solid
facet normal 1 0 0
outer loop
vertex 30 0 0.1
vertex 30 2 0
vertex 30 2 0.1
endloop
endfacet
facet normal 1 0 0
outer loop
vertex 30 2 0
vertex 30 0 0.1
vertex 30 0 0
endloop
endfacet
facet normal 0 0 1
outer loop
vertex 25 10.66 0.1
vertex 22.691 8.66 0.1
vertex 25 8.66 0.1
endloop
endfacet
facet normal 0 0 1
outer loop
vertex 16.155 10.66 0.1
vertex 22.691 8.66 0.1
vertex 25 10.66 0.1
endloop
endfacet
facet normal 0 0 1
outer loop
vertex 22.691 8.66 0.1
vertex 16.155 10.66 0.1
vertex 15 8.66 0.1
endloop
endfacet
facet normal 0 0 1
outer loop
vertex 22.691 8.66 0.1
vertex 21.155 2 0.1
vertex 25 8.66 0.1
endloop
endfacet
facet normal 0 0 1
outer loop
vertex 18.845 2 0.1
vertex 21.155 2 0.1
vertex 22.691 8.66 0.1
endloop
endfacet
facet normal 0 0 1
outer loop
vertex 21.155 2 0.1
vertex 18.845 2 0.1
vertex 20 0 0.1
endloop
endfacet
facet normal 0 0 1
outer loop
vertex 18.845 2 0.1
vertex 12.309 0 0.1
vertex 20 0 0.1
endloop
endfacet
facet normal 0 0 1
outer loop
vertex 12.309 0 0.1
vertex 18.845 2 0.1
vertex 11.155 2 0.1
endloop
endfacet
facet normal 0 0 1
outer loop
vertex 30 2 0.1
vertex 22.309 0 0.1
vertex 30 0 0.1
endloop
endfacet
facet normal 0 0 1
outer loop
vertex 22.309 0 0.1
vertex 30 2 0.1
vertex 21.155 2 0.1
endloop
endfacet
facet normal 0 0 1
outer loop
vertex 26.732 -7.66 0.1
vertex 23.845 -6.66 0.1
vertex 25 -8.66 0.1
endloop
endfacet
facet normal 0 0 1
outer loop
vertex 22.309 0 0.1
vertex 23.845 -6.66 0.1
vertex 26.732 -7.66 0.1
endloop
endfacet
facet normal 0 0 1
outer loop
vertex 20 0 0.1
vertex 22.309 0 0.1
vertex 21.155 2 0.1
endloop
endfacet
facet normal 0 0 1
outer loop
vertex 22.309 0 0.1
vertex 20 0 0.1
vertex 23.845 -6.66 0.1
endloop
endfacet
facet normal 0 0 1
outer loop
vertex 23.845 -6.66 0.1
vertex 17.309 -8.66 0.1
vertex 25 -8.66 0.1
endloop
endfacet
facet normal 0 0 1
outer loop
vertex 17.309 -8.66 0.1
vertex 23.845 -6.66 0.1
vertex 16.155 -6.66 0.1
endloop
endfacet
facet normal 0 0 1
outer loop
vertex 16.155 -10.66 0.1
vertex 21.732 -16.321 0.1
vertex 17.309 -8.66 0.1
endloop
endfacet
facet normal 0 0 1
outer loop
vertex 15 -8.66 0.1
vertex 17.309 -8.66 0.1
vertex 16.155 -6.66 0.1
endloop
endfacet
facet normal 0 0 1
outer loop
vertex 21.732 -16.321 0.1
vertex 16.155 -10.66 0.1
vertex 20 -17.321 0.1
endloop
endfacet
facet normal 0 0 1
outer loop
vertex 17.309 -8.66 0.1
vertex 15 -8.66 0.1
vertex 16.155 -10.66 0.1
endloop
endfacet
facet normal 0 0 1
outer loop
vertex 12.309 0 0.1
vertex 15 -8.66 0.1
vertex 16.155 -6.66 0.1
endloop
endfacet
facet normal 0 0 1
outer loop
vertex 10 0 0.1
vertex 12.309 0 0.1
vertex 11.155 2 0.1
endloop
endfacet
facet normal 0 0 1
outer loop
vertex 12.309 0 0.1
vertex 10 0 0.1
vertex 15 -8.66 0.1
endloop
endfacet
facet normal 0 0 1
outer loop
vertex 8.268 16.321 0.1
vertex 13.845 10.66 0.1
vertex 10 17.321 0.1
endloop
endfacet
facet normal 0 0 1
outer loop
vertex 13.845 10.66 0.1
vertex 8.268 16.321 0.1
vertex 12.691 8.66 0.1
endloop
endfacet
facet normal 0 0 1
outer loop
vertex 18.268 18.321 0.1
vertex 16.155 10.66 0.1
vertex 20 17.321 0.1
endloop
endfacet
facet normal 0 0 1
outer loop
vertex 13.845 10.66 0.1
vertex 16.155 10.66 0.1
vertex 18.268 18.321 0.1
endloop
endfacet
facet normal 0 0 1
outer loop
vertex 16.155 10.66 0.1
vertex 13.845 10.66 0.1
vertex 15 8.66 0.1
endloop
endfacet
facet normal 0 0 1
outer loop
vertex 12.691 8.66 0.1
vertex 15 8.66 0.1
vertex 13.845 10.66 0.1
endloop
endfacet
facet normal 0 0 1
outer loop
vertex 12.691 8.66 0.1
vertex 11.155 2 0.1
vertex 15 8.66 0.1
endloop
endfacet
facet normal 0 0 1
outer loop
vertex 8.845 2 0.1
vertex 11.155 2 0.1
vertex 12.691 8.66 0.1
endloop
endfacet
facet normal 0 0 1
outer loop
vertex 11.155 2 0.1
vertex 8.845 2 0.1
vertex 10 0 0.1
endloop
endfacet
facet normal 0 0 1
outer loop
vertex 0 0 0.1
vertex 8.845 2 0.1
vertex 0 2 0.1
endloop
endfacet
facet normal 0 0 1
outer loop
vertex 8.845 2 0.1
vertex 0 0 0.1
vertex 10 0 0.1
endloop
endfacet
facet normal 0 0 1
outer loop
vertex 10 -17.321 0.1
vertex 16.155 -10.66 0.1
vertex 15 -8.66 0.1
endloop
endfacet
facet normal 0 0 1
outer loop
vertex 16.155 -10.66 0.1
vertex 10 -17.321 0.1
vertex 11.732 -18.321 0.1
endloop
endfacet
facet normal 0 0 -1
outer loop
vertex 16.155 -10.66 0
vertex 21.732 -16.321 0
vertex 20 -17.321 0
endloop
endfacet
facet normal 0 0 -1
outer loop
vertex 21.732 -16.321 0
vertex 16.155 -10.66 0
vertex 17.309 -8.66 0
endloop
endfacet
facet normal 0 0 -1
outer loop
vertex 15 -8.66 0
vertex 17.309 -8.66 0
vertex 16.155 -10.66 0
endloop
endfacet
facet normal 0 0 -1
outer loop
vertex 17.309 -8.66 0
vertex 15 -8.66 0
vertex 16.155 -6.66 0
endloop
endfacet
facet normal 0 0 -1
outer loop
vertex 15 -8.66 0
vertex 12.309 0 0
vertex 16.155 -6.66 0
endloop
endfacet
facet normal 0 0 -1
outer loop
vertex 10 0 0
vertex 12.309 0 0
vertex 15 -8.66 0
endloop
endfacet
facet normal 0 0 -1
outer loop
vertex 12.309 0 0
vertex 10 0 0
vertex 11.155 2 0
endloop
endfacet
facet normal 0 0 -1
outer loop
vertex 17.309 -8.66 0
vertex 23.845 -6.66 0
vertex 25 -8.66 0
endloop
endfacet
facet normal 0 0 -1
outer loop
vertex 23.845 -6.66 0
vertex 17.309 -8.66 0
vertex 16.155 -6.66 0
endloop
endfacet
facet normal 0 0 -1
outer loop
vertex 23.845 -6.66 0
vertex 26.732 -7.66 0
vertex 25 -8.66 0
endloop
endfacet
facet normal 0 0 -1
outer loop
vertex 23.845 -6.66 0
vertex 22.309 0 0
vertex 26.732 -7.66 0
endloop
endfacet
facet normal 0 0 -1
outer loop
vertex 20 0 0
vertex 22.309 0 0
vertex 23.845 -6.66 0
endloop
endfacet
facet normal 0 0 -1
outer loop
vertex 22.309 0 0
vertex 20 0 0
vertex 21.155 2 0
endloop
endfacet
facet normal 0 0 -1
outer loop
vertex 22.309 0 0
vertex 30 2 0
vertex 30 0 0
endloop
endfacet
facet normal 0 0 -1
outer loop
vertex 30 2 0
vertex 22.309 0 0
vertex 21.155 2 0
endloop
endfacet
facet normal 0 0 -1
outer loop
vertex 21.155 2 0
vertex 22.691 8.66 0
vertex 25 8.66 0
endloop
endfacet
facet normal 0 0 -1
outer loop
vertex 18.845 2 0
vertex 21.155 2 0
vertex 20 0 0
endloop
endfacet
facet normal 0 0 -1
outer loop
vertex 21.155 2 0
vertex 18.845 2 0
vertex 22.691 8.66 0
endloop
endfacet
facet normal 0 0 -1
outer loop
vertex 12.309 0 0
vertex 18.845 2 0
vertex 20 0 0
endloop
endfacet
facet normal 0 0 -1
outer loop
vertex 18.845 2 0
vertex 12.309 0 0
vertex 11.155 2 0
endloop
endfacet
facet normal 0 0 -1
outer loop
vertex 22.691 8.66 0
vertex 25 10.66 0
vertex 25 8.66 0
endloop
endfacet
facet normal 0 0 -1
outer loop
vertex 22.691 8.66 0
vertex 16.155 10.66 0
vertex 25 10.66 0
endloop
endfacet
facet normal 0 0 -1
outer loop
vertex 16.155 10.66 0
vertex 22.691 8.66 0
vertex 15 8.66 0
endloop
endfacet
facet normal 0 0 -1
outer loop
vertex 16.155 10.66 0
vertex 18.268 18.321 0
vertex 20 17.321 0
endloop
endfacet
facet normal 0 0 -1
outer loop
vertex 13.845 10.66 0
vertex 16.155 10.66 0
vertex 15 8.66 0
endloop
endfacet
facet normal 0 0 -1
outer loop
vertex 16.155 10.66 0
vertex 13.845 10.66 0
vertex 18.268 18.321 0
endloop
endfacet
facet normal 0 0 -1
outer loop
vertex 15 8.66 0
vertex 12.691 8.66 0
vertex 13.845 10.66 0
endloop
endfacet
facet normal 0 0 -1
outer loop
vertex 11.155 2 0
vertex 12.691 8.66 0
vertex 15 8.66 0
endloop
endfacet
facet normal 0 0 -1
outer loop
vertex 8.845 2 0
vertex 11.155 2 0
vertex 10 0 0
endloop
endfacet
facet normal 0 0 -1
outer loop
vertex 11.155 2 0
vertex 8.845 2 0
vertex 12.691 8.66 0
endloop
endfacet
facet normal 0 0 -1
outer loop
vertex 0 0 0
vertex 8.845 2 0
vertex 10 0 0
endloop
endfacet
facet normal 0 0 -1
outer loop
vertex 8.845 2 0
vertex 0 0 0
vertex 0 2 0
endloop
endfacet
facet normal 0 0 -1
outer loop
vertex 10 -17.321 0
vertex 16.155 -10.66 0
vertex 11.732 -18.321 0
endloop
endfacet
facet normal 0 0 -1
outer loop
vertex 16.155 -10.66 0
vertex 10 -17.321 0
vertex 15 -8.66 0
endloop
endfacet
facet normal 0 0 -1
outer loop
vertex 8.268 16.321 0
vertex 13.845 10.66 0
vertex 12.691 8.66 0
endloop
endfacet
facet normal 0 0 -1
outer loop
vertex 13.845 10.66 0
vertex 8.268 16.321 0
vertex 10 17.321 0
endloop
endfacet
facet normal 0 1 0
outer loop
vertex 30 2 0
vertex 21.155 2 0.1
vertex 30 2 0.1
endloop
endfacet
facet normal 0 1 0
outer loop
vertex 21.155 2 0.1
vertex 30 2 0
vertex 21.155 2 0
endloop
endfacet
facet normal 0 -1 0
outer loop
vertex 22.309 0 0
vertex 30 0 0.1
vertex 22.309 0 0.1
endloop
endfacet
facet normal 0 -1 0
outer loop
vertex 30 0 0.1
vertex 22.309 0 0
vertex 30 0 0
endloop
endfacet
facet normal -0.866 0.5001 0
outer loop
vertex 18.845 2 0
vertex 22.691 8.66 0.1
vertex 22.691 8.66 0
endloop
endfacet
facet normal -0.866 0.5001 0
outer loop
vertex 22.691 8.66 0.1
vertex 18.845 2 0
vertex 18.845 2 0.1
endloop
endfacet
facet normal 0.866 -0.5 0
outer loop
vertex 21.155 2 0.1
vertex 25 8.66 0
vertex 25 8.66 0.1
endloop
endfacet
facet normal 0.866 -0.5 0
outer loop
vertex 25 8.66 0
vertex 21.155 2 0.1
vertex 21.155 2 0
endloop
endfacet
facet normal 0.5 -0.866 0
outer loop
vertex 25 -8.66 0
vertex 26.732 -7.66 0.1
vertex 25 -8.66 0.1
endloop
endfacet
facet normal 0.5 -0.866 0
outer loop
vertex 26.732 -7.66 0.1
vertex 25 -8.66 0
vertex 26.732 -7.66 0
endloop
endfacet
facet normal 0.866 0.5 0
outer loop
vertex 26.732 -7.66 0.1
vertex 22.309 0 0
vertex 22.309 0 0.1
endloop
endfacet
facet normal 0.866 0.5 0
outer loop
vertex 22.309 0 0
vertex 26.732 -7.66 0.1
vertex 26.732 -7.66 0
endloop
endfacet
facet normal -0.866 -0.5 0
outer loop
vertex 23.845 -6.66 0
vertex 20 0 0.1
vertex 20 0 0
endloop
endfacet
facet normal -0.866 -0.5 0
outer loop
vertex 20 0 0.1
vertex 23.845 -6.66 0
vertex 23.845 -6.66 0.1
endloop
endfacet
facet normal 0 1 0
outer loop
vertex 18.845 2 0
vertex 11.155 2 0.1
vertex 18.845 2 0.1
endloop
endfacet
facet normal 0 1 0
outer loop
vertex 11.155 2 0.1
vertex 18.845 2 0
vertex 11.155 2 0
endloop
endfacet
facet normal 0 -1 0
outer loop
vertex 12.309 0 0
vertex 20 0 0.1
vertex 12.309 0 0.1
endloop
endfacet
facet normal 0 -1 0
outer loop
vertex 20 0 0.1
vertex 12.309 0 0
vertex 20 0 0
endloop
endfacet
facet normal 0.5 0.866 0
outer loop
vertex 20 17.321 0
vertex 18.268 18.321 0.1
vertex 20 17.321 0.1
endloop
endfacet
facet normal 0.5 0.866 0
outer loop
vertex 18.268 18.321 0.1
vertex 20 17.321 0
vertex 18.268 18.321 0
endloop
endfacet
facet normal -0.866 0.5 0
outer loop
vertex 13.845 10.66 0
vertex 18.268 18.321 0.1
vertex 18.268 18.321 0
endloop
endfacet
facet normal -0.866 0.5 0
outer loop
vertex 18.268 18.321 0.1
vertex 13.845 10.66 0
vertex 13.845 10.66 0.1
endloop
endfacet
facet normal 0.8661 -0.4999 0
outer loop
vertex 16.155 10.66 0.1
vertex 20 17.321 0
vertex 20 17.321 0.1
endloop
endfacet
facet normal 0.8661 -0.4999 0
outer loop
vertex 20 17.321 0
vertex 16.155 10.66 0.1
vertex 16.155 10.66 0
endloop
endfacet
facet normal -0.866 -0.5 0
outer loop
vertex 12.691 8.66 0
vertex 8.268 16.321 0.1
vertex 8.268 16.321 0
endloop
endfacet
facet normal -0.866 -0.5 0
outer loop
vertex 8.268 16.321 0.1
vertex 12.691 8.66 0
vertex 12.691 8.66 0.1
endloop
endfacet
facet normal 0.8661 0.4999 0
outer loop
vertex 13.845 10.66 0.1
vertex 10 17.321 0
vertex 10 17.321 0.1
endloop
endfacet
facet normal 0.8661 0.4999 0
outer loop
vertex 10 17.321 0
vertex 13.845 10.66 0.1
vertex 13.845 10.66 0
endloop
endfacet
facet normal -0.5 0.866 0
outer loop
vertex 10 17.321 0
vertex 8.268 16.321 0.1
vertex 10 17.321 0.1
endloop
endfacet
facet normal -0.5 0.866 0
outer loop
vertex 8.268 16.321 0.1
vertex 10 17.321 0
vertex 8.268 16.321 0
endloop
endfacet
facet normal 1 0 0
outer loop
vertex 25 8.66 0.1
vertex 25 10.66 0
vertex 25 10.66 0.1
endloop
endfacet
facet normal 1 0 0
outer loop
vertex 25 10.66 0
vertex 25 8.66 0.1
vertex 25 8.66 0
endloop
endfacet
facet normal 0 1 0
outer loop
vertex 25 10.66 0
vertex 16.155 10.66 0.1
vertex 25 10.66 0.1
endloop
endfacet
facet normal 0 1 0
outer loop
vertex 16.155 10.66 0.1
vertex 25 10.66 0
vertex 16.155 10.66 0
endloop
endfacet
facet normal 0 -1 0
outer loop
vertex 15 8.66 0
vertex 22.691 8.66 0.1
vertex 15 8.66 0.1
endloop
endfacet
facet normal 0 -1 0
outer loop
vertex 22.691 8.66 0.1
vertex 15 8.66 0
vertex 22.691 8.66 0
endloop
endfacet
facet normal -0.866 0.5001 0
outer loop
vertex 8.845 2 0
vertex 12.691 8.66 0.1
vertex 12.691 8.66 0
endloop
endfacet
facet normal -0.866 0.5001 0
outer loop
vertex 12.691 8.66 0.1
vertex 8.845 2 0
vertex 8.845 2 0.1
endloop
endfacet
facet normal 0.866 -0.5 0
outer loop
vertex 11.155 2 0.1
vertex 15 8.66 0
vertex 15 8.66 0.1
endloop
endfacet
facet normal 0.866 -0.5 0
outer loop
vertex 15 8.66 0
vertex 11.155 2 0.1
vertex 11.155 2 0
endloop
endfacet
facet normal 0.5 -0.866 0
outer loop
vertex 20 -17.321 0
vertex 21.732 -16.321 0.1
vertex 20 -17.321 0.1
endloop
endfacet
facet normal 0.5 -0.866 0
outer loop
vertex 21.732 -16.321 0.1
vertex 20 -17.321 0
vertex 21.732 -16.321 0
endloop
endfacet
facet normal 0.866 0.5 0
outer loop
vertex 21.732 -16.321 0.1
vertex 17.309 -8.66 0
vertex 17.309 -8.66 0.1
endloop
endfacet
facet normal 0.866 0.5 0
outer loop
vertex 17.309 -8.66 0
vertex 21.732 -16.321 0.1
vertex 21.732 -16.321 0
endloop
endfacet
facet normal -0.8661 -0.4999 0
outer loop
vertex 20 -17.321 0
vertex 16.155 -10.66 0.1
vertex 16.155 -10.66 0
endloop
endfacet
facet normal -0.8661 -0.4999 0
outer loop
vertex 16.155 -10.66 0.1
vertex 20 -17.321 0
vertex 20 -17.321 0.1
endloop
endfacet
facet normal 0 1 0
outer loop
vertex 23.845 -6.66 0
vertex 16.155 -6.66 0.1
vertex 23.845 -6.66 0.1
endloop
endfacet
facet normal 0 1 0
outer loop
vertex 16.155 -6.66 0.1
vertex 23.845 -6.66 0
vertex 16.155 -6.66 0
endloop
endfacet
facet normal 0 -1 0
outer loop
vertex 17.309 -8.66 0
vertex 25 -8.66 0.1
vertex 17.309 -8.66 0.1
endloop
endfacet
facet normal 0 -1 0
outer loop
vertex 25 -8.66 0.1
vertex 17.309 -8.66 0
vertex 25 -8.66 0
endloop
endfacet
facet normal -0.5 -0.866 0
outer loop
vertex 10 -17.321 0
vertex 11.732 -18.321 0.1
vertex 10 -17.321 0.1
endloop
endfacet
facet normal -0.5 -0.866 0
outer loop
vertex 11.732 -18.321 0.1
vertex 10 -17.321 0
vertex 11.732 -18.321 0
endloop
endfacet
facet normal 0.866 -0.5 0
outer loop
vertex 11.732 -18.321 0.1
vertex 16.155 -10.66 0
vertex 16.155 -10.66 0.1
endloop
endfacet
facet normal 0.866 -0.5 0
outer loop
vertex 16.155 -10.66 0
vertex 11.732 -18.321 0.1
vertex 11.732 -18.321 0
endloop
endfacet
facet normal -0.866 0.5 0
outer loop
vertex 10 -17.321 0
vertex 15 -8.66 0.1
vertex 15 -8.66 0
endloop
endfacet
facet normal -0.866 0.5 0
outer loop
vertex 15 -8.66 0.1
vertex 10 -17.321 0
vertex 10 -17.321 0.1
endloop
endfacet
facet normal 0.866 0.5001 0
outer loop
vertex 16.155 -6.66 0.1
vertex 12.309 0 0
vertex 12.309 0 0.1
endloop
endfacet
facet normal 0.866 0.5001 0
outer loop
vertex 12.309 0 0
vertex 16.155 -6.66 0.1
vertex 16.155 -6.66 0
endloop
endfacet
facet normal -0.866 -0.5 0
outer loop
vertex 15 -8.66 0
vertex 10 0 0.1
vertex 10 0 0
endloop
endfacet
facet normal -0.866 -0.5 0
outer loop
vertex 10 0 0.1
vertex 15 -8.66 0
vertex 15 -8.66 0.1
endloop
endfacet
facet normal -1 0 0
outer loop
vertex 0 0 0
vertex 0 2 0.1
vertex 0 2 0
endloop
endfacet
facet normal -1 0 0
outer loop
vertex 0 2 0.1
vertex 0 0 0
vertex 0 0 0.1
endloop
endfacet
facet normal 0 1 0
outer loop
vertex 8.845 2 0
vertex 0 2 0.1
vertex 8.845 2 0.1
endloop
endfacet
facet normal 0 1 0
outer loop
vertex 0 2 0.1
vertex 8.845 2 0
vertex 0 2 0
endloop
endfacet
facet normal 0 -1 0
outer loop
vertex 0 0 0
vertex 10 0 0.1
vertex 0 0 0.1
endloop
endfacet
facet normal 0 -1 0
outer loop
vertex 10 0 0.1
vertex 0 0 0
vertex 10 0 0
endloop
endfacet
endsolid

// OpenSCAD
/*
 * Welcome to the Advent Calendar - Tutorial Edition - Part 13
 */

step = 1; // [1:7]

/*** STEP 1 ***/

// In this tutorial, we will use module recursion to create a snowflake
// generator!  First let us consider a few properties of snowflakes.
// Snowflakes are fractal in nature, branching off at 60 degree angles.
// To do module recursion, we must call the same module, but we want to
// do it only a finite number of times. So we will call Step1 with the
// variable i increasing by 1 each time, and not call it anymore if i
// is 2 or more.  We will also draw a cube in each call, and translate
// all the other calls to the end of the cube.
//
// Important note!  Notice how the rotate and translate combine when we
// use recursion.  Each subsequent recursion is rotated and translated
// onto the end of the one that called it, in a branching manner!
// Try to understand this carefully before proceeding.

module Step1(length, width, i=0) {
  color("white") color("white") cube([length, width, 0.1]);
  if (i < 2) {
    translate([length, 0, 0]) {
      Step1(length, width, i+1);
      rotate([0, 0, 60]) Step1(length, width, i+1);
      rotate([0, 0, -60]) Step1(length, width, i+1);
    }
  }
}

if (step == 1) {
  Step1(10, 2);
}

/*** STEP 2 ***/

// Another important property of snowflakes is that they, on average,
// tend to have pieces get shorter and thinner as they branch away.
// Not always, but on average, so let's start there.  We can just make
// the length and width shrink a bit for each call.  And let's add one
// more depth level.

module Step2(length, width, i=0) {
  length = 0.7*length;
  width = 0.7*width;
  color("white") color("white") cube([length, width, 0.1]);
  if (i < 3) {
    translate([length, 0, 0]) {
      Step2(length, width, i+1);
      rotate([0, 0, 60]) Step2(length, width, i+1);
      rotate([0, 0, -60]) Step2(length, width, i+1);
    }
  }
}

if (step == 2) {
  Step2(10, 2);
}

/*** STEP 3 ***/

// Now, real snowflakes start out from the center in all 6 directions,
// again at those 60 degree steps, so let's just loop over the initial
// angle.  It's starting to look snowflake-like!

if (step == 3) {
  for (a=[0:60:359]) {
    rotate([0, 0, a]) Step2(10, 2);
  }
}

/*** STEP 4 ***/

// One small defect is clear if you look at the center of step 3.
// The cubes are off-center, so we want to translate them down by half
// of their width.  Also, we want more variation in our snowflakes.
// Real snowflakes have their length and width of elements changing
// over time as they grow by changing atmospheric conditions as they
// fall and continue growing!
//
// So let's generate a long sequence (200 should be enough) of random
// values from 0 to just under 1, and at each step, we'll use these to
// raise or lower the length, and raise or lower the width.  For random
// values from 0 to 1, 10*random_value-5 will give us numbers from -5 to
// just under 5.  And with that 0.7 multiplied, we're still on average
// shrinking them at each depth.
//
// Let's also add some more recursion, and go to depth 6.
//
// Preview this step a bunch of times.  Each one will be different!
// Some will look great.  Some will be weirdly clunky.  And some will
// have gaps.  The gaps are because we didn't stop values from going
// negative...

randvals = rands(0,1,200);

module Step4(randvals, length, width, i=0) {
  length = 0.7*(length + 10*randvals[i] - 5);
  width = 0.7*(width + 2*randvals[i+1] - 1);
  translate([0, -width/2, 0]) color("white") cube([length, width, 0.1]);
  if (i < 6) {
    translate([length, 0, 0]) {
      Step4(randvals, length, width, i+2);
      rotate([0, 0, 60]) Step4(randvals, length, width, i+2);
      rotate([0, 0, -60]) Step4(randvals, length, width, i+2);
    }
  }
}

if (step == 4) {
  for (a=[0:60:359]) {
    rotate([0, 0, a]) Step4(randvals, 10, 2);
  }
}

/*** STEP 5 ***/

// Here, we'll add in a max at length and width, to keep the values
// positive.  We'll set a minimum length or width of 0.3.  Also, let's
// add a bit more asymmetry to look more real.  An easy trick is to
// just change the offset i for calls to the left or right recursion,
// so they are grabbing different random values from our list!

module Step5(randvals, length, width, i=0) {
  length = max(0.3, 0.7*(length + 10*randvals[i] - 5));
  width = max(0.3, 0.7*(width + 2*randvals[i+1] - 1));
  translate([0, -width/2, 0]) color("white") cube([length, width, 0.1]);
  if (i < 8) {
    translate([length, 0, 0]) {
      Step5(randvals, length, width, i+2);
      rotate([0, 0, 60]) Step5(randvals, length, width, i+3);
      rotate([0, 0, -60]) Step5(randvals, length, width, i+4);
    }
  }
}

if (step == 5) {
  for (a=[0:60:359]) {
    rotate([0, 0, a]) Step5(randvals, 10, 2);
  }
}

/*** STEP 6 ***/

// Stopping at a hard-stop of depth 8 was not an ideal way to stop, as
// it left the i+4 path getting there before the i+3 path, and so on.
// We can try some cleverer expression to stop.  For example, we first
// make sure we don't go past the length of our random values (although
// we have plenty), then we make sure that we keep iterating at least
// 10 times.  But then after that, we stop at random!  We just check a
// value, and 1/5th of the time, we stop.
//
// We can also move the randvals generation into a module call, so that
// we have a self-contained "Snowflake" module that generates a random
// snowflake each time it is called.

module SnowflakeRec(randvals, length, width, i=0) {
  length = max(0.3, 0.7*(length + 10*randvals[i] - 5));
  width = max(0.3, 0.7*(width + 2*randvals[i+1] - 1));
  translate([0, -width/2, 0]) color("white") cube([length, width, 0.1]);
  if ((i+10 < len(randvals)) && (i<10 || randvals[i+2] < 0.2)) {
    translate([length, 0, 0]) {
      SnowflakeRec(randvals, length, width, i+3);
      rotate([0, 0, 60]) SnowflakeRec(randvals, length, width, i+4);
      rotate([0, 0, -60]) SnowflakeRec(randvals, length, width, i+5);
    }
  }
}

module Snowflake() {
  randvals = rands(0,1,200);
  for (a=[0:60:359]) {
    rotate([0, 0, a]) SnowflakeRec(randvals, 10, 2);
  }
}

if (step == 6) {
  Snowflake();
}

/*** STEP 7 ***/

// And for the last step, let's just show the variety of what we can
// make with this.  Let's make a 3x3 grid of snowflakes (taking up the
// same area).

if (step == 7) {
  scale([1/3, 1/3, 1/3]) {
    for (x=[-80:80:80]) {
      for (y=[-80:80:80]) {
        translate([x, y, 0]) Snowflake();
      }
    }
  }
}

/*** THE END ***/

/*********************************************************************/

// Written in 2024 by Ryan A. Colyer.
//
// To the extent possible under law, the author(s) have dedicated all
// copyright and related and neighboring rights to this software to
// the public domain worldwide. This software is distributed without
// any warranty.
//
// You should have received a copy of the CC0 Public
// Domain Dedication along with this software.  If not, see
// <http://creativecommons.org/publicdomain/zero/1.0/>.
